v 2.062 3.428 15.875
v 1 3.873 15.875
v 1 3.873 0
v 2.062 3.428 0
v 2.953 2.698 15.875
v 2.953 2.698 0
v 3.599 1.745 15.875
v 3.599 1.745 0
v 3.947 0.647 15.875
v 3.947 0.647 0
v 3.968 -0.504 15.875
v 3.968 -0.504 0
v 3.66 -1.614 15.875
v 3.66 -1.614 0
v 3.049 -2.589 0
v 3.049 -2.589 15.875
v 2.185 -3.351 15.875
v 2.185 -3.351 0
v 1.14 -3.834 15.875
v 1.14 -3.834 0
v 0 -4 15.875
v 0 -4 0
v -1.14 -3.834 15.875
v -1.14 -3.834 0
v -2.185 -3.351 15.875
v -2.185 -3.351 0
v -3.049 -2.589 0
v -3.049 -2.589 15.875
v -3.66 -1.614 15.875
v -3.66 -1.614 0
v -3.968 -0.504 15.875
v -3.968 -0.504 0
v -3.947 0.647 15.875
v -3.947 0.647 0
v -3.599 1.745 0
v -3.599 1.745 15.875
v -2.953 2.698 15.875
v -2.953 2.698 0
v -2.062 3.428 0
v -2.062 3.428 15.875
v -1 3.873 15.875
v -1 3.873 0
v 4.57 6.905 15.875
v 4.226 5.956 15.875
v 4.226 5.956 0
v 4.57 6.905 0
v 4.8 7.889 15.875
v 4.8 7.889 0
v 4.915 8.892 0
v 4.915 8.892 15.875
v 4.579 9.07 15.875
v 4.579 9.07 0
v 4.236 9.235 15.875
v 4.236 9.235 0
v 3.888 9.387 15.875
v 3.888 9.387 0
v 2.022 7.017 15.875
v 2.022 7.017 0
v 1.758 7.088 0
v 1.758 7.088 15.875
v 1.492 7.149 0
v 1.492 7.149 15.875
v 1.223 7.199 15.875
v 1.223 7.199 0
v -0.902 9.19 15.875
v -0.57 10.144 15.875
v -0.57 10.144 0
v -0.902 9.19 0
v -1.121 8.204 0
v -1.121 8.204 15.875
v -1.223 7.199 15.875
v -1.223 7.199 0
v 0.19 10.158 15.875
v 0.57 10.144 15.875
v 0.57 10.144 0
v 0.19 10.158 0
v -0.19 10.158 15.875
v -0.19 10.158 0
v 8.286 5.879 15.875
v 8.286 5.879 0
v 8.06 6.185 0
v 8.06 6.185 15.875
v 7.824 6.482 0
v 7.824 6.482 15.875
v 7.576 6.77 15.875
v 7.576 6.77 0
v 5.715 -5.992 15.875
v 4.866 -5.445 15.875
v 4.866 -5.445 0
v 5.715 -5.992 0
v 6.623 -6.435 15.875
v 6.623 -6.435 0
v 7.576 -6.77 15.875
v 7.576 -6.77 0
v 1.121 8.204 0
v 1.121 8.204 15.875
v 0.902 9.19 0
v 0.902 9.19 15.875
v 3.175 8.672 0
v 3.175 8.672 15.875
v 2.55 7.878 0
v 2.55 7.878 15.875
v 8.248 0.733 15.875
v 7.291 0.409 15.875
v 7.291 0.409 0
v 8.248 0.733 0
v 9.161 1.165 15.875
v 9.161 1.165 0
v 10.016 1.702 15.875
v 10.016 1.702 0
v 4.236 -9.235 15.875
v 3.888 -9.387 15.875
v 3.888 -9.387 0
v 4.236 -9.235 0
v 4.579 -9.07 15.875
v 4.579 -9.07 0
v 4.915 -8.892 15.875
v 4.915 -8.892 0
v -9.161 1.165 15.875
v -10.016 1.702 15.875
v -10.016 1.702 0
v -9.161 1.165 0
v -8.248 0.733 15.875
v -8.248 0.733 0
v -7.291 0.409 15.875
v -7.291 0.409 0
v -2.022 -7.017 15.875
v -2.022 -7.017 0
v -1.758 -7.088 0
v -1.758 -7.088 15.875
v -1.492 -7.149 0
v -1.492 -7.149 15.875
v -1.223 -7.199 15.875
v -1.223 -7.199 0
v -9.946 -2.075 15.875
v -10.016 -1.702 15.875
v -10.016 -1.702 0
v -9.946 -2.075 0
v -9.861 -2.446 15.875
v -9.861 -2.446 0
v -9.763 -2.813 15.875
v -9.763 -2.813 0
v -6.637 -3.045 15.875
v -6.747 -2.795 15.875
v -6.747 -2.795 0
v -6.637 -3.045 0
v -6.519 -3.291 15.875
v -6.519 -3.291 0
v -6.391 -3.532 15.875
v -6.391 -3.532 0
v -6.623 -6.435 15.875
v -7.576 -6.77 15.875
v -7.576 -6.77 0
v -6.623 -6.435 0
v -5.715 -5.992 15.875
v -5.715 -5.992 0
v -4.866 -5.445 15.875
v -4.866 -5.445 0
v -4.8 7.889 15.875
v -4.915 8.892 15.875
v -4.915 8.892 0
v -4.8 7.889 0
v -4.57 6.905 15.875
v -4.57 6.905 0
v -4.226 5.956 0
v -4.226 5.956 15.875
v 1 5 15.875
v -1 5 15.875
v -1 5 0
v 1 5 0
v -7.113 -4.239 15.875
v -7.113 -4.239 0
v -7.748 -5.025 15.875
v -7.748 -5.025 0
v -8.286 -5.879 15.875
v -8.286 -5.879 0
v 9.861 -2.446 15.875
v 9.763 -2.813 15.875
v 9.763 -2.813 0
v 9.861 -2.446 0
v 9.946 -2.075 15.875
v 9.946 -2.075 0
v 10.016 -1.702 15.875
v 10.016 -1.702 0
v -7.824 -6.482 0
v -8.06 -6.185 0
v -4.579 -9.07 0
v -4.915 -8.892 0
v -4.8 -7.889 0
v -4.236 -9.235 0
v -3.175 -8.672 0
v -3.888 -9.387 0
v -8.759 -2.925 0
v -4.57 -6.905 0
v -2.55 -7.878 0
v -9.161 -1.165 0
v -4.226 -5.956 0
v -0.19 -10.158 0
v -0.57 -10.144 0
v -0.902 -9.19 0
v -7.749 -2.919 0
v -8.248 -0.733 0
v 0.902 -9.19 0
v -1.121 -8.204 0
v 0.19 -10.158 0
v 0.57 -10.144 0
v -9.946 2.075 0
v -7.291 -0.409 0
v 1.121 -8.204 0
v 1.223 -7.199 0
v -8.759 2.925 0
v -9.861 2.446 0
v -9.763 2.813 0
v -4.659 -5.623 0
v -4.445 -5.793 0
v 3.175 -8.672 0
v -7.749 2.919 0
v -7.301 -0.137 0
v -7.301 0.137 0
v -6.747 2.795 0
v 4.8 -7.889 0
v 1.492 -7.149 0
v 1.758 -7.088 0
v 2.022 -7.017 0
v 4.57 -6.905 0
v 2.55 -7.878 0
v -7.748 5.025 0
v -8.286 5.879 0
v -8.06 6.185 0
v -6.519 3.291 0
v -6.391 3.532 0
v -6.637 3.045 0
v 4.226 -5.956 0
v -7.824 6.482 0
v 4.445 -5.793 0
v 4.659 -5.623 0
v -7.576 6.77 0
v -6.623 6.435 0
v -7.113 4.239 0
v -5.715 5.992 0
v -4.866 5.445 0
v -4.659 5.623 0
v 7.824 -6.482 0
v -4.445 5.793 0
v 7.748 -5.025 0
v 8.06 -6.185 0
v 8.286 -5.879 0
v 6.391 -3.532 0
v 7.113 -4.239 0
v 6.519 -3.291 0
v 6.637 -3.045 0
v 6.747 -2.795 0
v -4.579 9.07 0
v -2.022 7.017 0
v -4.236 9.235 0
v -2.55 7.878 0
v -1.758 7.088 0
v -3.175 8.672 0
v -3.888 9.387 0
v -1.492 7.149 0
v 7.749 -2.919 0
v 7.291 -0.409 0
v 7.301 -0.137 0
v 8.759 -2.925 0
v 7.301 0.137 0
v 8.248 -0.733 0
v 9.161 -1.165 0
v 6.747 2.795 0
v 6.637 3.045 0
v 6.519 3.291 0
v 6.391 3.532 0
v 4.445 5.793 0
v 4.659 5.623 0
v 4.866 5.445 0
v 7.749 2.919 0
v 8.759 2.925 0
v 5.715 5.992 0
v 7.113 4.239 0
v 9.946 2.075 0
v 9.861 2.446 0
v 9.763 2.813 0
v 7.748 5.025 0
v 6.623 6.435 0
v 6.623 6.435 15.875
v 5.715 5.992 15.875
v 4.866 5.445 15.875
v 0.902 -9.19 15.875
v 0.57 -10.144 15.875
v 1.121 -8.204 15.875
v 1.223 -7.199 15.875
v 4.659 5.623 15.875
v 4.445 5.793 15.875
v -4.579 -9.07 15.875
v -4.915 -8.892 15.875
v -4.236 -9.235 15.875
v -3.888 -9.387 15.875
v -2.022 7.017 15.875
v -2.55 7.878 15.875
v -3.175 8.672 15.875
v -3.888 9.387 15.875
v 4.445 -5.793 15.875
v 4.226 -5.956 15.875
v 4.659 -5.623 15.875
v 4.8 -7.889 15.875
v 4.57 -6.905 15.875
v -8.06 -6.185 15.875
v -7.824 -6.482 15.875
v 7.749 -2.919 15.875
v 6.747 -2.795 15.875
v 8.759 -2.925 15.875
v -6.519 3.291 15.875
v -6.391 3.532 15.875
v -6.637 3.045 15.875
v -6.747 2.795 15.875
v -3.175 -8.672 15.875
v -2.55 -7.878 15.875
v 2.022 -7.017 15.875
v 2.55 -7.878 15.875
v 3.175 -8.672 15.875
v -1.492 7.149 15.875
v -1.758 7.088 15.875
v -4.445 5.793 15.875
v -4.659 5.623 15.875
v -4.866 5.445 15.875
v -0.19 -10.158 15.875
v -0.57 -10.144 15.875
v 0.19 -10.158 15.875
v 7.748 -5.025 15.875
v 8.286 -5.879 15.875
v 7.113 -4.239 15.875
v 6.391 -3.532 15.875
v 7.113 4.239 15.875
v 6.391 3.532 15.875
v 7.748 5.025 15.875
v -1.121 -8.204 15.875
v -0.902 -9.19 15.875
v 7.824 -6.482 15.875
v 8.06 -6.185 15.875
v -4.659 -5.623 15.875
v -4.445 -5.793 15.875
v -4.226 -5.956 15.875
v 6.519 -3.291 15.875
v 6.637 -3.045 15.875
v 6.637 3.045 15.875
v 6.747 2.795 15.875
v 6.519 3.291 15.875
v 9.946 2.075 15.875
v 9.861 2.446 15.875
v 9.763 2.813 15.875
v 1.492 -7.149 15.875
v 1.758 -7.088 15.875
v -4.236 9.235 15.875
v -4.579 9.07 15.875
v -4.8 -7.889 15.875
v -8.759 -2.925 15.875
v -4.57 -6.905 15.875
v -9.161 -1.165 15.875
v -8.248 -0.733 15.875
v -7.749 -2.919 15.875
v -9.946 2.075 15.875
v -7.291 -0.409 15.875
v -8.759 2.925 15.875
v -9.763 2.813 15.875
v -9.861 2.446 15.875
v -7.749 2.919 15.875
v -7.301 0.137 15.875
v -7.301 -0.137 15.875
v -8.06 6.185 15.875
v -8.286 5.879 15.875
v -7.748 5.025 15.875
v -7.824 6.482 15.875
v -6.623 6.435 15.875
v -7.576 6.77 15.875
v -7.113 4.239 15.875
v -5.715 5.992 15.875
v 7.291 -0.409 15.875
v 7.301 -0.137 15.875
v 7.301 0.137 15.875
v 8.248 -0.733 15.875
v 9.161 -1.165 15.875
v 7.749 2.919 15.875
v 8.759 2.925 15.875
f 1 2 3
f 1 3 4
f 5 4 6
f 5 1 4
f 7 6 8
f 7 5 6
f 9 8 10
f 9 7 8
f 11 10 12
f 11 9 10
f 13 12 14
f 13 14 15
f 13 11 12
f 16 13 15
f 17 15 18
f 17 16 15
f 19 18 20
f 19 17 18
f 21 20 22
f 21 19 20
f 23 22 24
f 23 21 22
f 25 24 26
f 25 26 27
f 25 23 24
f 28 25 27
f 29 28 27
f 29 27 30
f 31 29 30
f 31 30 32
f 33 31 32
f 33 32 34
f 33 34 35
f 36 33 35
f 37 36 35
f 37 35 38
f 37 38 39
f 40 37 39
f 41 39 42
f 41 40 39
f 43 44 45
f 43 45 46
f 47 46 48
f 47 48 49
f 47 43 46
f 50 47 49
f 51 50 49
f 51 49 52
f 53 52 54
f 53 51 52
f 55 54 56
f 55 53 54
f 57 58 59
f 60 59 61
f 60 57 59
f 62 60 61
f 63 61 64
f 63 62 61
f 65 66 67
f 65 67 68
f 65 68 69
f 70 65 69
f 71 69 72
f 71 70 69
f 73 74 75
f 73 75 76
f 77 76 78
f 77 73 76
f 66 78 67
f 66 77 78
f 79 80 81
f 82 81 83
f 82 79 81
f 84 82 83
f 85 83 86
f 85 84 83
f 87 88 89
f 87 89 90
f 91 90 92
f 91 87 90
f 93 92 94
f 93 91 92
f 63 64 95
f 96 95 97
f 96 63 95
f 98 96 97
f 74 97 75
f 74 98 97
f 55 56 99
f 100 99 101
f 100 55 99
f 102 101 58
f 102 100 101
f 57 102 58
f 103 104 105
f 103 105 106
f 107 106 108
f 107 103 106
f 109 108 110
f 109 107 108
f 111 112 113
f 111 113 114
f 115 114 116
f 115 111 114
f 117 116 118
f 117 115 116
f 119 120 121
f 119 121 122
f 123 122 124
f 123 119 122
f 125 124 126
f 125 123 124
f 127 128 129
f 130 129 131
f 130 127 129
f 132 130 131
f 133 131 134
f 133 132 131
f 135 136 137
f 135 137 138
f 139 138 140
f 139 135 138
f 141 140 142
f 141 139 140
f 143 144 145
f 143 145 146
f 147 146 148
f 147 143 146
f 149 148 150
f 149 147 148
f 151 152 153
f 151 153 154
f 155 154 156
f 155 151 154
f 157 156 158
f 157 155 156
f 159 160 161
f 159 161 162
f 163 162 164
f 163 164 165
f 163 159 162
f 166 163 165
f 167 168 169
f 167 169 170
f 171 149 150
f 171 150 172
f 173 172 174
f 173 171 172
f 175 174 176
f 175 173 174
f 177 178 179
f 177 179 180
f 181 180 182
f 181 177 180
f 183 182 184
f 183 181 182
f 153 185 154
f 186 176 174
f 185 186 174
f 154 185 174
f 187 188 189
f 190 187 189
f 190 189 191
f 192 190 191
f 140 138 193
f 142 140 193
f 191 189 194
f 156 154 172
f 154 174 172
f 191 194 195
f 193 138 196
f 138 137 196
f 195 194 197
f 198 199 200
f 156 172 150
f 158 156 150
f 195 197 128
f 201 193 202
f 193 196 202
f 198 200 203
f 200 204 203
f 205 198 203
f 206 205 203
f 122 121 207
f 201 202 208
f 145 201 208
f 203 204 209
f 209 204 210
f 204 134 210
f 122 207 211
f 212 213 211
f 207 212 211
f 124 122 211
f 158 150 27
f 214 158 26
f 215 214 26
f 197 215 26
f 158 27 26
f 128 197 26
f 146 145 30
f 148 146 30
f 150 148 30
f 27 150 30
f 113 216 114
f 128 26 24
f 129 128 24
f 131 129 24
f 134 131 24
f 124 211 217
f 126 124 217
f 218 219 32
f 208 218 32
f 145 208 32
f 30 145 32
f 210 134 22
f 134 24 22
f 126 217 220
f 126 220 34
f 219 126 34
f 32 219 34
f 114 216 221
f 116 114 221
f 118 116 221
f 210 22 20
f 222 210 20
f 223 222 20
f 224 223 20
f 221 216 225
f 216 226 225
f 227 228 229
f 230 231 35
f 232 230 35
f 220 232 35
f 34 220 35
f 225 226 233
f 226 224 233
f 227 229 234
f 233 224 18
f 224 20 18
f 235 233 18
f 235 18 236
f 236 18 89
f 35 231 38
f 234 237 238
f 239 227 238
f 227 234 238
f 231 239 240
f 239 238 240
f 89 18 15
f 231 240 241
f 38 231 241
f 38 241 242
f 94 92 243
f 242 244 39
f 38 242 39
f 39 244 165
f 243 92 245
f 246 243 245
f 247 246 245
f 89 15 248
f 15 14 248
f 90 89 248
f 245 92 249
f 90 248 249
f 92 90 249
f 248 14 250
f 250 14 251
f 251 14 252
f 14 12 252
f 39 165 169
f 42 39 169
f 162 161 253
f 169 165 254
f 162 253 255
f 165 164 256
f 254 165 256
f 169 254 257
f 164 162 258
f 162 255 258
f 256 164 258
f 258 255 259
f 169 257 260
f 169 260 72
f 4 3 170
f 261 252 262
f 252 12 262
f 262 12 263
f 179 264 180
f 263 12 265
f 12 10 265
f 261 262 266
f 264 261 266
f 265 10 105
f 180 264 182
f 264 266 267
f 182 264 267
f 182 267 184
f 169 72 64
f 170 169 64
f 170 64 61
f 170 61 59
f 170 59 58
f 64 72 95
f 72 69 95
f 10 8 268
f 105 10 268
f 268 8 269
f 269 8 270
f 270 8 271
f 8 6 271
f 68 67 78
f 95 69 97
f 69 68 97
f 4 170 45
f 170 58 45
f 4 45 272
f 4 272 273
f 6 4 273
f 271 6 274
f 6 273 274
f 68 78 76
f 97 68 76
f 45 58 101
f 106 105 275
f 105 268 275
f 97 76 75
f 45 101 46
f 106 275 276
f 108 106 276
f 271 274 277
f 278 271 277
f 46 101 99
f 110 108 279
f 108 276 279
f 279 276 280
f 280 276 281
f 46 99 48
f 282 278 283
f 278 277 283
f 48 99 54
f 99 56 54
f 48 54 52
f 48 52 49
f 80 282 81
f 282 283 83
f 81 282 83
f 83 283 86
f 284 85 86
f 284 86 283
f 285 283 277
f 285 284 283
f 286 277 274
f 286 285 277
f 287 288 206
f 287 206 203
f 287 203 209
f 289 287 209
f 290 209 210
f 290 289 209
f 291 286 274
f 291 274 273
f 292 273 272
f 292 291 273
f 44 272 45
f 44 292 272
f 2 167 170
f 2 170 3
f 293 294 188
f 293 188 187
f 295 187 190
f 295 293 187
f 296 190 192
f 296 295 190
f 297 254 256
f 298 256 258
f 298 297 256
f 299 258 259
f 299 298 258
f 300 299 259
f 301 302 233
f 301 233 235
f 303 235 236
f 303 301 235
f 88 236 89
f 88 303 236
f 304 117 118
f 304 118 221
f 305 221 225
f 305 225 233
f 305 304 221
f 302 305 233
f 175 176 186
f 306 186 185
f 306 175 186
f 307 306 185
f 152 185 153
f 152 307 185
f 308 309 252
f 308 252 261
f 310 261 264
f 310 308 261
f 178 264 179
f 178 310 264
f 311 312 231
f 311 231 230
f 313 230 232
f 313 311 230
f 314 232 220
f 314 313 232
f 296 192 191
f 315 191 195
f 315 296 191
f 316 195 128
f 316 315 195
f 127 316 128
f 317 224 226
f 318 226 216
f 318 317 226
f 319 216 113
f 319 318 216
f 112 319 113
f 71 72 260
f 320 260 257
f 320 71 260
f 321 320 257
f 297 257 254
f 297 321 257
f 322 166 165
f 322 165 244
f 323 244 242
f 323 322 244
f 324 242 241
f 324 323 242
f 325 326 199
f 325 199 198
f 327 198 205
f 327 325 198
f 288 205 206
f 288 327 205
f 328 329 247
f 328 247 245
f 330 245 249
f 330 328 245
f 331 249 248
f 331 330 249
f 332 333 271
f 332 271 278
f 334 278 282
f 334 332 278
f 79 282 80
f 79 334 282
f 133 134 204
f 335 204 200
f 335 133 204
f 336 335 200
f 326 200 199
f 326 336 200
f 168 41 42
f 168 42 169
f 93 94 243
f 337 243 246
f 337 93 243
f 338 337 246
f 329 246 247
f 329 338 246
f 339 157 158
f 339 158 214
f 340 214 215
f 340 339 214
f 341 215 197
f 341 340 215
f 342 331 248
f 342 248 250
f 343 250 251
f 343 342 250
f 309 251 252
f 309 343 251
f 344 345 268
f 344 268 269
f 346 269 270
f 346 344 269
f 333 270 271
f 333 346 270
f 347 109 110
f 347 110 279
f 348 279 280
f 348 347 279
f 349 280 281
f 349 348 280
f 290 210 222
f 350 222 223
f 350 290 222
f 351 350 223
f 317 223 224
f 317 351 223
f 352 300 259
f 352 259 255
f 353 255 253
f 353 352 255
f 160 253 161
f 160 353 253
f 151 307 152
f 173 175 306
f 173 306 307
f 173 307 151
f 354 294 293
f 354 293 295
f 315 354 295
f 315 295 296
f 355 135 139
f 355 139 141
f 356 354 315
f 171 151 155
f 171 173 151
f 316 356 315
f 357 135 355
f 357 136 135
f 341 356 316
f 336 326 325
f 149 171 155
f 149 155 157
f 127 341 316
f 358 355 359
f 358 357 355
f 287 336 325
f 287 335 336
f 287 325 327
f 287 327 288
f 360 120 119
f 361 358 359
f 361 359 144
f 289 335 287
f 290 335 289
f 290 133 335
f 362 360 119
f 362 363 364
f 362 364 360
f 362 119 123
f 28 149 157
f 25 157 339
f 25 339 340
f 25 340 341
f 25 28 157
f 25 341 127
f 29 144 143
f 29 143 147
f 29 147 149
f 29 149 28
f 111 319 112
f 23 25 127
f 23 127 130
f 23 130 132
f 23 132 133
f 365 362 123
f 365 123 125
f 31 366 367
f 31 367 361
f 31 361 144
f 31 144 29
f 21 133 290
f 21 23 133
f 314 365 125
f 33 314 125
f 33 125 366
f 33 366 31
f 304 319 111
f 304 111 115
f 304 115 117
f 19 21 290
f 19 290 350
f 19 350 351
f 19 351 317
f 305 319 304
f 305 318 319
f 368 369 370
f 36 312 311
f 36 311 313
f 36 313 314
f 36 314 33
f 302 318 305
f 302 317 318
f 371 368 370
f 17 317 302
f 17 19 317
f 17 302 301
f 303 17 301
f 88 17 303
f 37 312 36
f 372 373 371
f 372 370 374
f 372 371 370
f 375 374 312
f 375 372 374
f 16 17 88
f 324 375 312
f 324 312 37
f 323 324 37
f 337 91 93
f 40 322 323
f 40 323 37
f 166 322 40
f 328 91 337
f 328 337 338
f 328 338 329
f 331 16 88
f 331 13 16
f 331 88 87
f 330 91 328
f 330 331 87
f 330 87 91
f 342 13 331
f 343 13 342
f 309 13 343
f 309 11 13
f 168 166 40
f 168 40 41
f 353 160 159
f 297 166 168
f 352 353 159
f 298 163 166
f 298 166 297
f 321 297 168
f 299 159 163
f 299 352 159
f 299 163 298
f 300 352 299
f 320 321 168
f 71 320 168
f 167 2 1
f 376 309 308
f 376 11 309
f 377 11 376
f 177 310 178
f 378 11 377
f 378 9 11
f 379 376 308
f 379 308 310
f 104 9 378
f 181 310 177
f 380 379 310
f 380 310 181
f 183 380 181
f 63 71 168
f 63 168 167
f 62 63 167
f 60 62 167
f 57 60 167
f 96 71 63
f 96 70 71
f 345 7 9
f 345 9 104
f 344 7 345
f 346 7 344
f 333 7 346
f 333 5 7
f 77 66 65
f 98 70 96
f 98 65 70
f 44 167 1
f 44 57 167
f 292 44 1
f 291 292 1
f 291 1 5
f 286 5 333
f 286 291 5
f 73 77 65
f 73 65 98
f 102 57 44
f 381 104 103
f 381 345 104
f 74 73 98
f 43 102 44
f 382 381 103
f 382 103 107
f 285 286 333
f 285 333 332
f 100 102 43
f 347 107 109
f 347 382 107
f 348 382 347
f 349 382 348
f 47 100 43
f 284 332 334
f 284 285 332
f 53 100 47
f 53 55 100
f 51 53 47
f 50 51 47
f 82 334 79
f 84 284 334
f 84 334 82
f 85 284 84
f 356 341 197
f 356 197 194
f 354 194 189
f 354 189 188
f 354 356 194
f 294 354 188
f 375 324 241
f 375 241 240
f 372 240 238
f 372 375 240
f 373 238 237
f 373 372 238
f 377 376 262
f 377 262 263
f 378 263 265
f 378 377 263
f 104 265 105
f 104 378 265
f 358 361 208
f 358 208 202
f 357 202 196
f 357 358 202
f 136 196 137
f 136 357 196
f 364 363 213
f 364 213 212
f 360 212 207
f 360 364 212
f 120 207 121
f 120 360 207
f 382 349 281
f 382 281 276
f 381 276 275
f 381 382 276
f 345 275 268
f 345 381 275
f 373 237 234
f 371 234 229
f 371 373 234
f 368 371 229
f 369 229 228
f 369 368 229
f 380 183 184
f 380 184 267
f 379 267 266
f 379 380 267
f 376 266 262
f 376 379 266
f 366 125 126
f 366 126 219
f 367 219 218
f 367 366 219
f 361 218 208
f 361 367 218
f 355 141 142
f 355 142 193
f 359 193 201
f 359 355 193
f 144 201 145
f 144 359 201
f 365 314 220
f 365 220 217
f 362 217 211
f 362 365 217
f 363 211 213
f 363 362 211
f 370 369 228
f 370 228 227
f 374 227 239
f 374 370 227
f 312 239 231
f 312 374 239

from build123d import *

# Parameters (mm, degrees)
BOSS_EXTRUDE1_DEPTH = 15.875


with BuildPart() as part:
    # Sketch1 → Boss-Extrude1 (new body)
    with BuildSketch(Plane.XY.offset(15.875)):
        with BuildLine():
            ThreePointArc((-3.888063673, 9.38661605), (-4.408258789, 9.153843698), (-4.914583893, 8.892269967))
            ThreePointArc((-4.914583893, 8.892269967), (-4.69950786, 7.393612219), (-4.22574714, 5.955633246))
            ThreePointArc((-4.22574714, 5.955633246), (-4.553034278, 5.709324401), (-4.865995885, 5.445051909))
            ThreePointArc((-4.865995885, 5.445051909), (-6.162500046, 6.226914882), (-7.575724395, 6.770081232))
            ThreePointArc((-7.575724395, 6.770081232), (-7.943407862, 6.334656387), (-8.286098429, 5.879300369))
            ThreePointArc((-8.286098429, 5.879300369), (-7.442078391, 4.622374388), (-6.391319038, 3.532357173))
            ThreePointArc((-6.391319038, 3.532357173), (-6.579325158, 3.168436005), (-6.746630286, 2.794545765))
            ThreePointArc((-6.746630286, 2.794545765), (-8.253977802, 2.93644789), (-9.762919991, 2.812648796))
            ThreePointArc((-9.762919991, 2.812648796), (-9.905267588, 2.260812689), (-10.016449548, 1.701863229))
            ThreePointArc((-10.016449548, 1.701863229), (-8.710654026, 0.93561862), (-7.291011817, 0.409454441))
            ThreePointArc((-7.291011817, 0.409454441), (-7.3025, 0), (-7.291011817, -0.409454441))
            ThreePointArc((-7.291011817, -0.409454441), (-8.710654026, -0.93561862), (-10.016449548, -1.701863229))
            ThreePointArc((-10.016449548, -1.701863229), (-9.905267588, -2.260812689), (-9.762919991, -2.812648796))
            ThreePointArc((-9.762919991, -2.812648796), (-8.253977802, -2.93644789), (-6.746630286, -2.794545765))
            ThreePointArc((-6.746630286, -2.794545765), (-6.579325158, -3.168436005), (-6.391319038, -3.532357173))
            ThreePointArc((-6.391319038, -3.532357173), (-7.442078391, -4.622374388), (-8.286098429, -5.879300369))
            ThreePointArc((-8.286098429, -5.879300369), (-7.943407862, -6.334656387), (-7.575724395, -6.770081232))
            ThreePointArc((-7.575724395, -6.770081232), (-6.162500046, -6.226914882), (-4.865995885, -5.445051909))
            ThreePointArc((-4.865995885, -5.445051909), (-4.553034278, -5.709324401), (-4.22574714, -5.955633246))
            ThreePointArc((-4.22574714, -5.955633246), (-4.69950786, -7.393612219), (-4.914583893, -8.892269967))
            ThreePointArc((-4.914583893, -8.892269967), (-4.408258789, -9.153843698), (-3.888063673, -9.38661605))
            ThreePointArc((-3.888063673, -9.38661605), (-2.850463577, -8.284065014), (-2.021591322, -7.017098744))
            ThreePointArc((-2.021591322, -7.017098744), (-1.62495912, -7.119411079), (-1.223214196, -7.199323113))
            ThreePointArc((-1.223214196, -7.199323113), (-1.026142161, -8.700454472), (-0.569675744, -10.144016441))
            ThreePointArc((-0.569675744, -10.144016441), (0, -10.16), (0.569675744, -10.144016441))
            ThreePointArc((0.569675744, -10.144016441), (1.026142161, -8.700454472), (1.223214196, -7.199323113))
            ThreePointArc((1.223214196, -7.199323113), (1.62495912, -7.119411079), (2.021591322, -7.017098744))
            ThreePointArc((2.021591322, -7.017098744), (2.850463577, -8.284065014), (3.888063673, -9.38661605))
            ThreePointArc((3.888063673, -9.38661605), (4.408258789, -9.153843698), (4.914583893, -8.892269967))
            ThreePointArc((4.914583893, -8.892269967), (4.69950786, -7.393612219), (4.22574714, -5.955633246))
            ThreePointArc((4.22574714, -5.955633246), (4.553034278, -5.709324401), (4.865995885, -5.445051909))
            ThreePointArc((4.865995885, -5.445051909), (6.162500046, -6.226914882), (7.575724395, -6.770081232))
            ThreePointArc((7.575724395, -6.770081232), (7.943407862, -6.334656387), (8.286098429, -5.879300369))
            ThreePointArc((8.286098429, -5.879300369), (7.442078391, -4.622374388), (6.391319038, -3.532357173))
            ThreePointArc((6.391319038, -3.532357173), (6.579325158, -3.168436005), (6.746630286, -2.794545765))
            ThreePointArc((6.746630286, -2.794545765), (8.253977802, -2.93644789), (9.762919991, -2.812648796))
            ThreePointArc((9.762919991, -2.812648796), (9.905267588, -2.260812689), (10.016449548, -1.701863229))
            ThreePointArc((10.016449548, -1.701863229), (8.710654026, -0.93561862), (7.291011817, -0.409454441))
            ThreePointArc((7.291011817, -0.409454441), (7.3025, 0), (7.291011817, 0.409454441))
            ThreePointArc((7.291011817, 0.409454441), (8.710654026, 0.93561862), (10.016449548, 1.701863229))
            ThreePointArc((10.016449548, 1.701863229), (9.905267588, 2.260812689), (9.762919991, 2.812648796))
            ThreePointArc((9.762919991, 2.812648796), (8.253977802, 2.93644789), (6.746630286, 2.794545765))
            ThreePointArc((6.746630286, 2.794545765), (6.579325158, 3.168436005), (6.391319038, 3.532357173))
            ThreePointArc((6.391319038, 3.532357173), (7.442078391, 4.622374388), (8.286098429, 5.879300369))
            ThreePointArc((8.286098429, 5.879300369), (7.943407862, 6.334656387), (7.575724395, 6.770081232))
            ThreePointArc((7.575724395, 6.770081232), (6.162500046, 6.226914882), (4.865995885, 5.445051909))
            ThreePointArc((4.865995885, 5.445051909), (4.553034278, 5.709324401), (4.22574714, 5.955633246))
            ThreePointArc((4.22574714, 5.955633246), (4.69950786, 7.393612219), (4.914583893, 8.892269967))
            ThreePointArc((4.914583893, 8.892269967), (4.408258789, 9.153843698), (3.888063673, 9.38661605))
            ThreePointArc((3.888063673, 9.38661605), (2.850463577, 8.284065014), (2.021591322, 7.017098744))
            ThreePointArc((2.021591322, 7.017098744), (1.62495912, 7.119411079), (1.223214196, 7.199323113))
            ThreePointArc((1.223214196, 7.199323113), (1.026142161, 8.700454472), (0.569675744, 10.144016441))
            ThreePointArc((0.569675744, 10.144016441), (0, 10.16), (-0.569675744, 10.144016441))
            ThreePointArc((-0.569675744, 10.144016441), (-1.026142161, 8.700454472), (-1.223214196, 7.199323113))
            ThreePointArc((-1.223214196, 7.199323113), (-1.62495912, 7.119411079), (-2.021591322, 7.017098744))
            ThreePointArc((-2.021591322, 7.017098744), (-2.850463577, 8.284065014), (-3.888063673, 9.38661605))
        make_face()
        with BuildLine():
            Line((1, 5), (1, 3.872983346))
            ThreePointArc((1, 3.872983346), (0, -4), (-1, 3.872983346))
            Line((-1, 3.872983346), (-1, 5))
            Line((-1, 5), (1, 5))
        make_face(mode=Mode.SUBTRACT)
    extrude(amount=-BOSS_EXTRUDE1_DEPTH)


solid = part.part
